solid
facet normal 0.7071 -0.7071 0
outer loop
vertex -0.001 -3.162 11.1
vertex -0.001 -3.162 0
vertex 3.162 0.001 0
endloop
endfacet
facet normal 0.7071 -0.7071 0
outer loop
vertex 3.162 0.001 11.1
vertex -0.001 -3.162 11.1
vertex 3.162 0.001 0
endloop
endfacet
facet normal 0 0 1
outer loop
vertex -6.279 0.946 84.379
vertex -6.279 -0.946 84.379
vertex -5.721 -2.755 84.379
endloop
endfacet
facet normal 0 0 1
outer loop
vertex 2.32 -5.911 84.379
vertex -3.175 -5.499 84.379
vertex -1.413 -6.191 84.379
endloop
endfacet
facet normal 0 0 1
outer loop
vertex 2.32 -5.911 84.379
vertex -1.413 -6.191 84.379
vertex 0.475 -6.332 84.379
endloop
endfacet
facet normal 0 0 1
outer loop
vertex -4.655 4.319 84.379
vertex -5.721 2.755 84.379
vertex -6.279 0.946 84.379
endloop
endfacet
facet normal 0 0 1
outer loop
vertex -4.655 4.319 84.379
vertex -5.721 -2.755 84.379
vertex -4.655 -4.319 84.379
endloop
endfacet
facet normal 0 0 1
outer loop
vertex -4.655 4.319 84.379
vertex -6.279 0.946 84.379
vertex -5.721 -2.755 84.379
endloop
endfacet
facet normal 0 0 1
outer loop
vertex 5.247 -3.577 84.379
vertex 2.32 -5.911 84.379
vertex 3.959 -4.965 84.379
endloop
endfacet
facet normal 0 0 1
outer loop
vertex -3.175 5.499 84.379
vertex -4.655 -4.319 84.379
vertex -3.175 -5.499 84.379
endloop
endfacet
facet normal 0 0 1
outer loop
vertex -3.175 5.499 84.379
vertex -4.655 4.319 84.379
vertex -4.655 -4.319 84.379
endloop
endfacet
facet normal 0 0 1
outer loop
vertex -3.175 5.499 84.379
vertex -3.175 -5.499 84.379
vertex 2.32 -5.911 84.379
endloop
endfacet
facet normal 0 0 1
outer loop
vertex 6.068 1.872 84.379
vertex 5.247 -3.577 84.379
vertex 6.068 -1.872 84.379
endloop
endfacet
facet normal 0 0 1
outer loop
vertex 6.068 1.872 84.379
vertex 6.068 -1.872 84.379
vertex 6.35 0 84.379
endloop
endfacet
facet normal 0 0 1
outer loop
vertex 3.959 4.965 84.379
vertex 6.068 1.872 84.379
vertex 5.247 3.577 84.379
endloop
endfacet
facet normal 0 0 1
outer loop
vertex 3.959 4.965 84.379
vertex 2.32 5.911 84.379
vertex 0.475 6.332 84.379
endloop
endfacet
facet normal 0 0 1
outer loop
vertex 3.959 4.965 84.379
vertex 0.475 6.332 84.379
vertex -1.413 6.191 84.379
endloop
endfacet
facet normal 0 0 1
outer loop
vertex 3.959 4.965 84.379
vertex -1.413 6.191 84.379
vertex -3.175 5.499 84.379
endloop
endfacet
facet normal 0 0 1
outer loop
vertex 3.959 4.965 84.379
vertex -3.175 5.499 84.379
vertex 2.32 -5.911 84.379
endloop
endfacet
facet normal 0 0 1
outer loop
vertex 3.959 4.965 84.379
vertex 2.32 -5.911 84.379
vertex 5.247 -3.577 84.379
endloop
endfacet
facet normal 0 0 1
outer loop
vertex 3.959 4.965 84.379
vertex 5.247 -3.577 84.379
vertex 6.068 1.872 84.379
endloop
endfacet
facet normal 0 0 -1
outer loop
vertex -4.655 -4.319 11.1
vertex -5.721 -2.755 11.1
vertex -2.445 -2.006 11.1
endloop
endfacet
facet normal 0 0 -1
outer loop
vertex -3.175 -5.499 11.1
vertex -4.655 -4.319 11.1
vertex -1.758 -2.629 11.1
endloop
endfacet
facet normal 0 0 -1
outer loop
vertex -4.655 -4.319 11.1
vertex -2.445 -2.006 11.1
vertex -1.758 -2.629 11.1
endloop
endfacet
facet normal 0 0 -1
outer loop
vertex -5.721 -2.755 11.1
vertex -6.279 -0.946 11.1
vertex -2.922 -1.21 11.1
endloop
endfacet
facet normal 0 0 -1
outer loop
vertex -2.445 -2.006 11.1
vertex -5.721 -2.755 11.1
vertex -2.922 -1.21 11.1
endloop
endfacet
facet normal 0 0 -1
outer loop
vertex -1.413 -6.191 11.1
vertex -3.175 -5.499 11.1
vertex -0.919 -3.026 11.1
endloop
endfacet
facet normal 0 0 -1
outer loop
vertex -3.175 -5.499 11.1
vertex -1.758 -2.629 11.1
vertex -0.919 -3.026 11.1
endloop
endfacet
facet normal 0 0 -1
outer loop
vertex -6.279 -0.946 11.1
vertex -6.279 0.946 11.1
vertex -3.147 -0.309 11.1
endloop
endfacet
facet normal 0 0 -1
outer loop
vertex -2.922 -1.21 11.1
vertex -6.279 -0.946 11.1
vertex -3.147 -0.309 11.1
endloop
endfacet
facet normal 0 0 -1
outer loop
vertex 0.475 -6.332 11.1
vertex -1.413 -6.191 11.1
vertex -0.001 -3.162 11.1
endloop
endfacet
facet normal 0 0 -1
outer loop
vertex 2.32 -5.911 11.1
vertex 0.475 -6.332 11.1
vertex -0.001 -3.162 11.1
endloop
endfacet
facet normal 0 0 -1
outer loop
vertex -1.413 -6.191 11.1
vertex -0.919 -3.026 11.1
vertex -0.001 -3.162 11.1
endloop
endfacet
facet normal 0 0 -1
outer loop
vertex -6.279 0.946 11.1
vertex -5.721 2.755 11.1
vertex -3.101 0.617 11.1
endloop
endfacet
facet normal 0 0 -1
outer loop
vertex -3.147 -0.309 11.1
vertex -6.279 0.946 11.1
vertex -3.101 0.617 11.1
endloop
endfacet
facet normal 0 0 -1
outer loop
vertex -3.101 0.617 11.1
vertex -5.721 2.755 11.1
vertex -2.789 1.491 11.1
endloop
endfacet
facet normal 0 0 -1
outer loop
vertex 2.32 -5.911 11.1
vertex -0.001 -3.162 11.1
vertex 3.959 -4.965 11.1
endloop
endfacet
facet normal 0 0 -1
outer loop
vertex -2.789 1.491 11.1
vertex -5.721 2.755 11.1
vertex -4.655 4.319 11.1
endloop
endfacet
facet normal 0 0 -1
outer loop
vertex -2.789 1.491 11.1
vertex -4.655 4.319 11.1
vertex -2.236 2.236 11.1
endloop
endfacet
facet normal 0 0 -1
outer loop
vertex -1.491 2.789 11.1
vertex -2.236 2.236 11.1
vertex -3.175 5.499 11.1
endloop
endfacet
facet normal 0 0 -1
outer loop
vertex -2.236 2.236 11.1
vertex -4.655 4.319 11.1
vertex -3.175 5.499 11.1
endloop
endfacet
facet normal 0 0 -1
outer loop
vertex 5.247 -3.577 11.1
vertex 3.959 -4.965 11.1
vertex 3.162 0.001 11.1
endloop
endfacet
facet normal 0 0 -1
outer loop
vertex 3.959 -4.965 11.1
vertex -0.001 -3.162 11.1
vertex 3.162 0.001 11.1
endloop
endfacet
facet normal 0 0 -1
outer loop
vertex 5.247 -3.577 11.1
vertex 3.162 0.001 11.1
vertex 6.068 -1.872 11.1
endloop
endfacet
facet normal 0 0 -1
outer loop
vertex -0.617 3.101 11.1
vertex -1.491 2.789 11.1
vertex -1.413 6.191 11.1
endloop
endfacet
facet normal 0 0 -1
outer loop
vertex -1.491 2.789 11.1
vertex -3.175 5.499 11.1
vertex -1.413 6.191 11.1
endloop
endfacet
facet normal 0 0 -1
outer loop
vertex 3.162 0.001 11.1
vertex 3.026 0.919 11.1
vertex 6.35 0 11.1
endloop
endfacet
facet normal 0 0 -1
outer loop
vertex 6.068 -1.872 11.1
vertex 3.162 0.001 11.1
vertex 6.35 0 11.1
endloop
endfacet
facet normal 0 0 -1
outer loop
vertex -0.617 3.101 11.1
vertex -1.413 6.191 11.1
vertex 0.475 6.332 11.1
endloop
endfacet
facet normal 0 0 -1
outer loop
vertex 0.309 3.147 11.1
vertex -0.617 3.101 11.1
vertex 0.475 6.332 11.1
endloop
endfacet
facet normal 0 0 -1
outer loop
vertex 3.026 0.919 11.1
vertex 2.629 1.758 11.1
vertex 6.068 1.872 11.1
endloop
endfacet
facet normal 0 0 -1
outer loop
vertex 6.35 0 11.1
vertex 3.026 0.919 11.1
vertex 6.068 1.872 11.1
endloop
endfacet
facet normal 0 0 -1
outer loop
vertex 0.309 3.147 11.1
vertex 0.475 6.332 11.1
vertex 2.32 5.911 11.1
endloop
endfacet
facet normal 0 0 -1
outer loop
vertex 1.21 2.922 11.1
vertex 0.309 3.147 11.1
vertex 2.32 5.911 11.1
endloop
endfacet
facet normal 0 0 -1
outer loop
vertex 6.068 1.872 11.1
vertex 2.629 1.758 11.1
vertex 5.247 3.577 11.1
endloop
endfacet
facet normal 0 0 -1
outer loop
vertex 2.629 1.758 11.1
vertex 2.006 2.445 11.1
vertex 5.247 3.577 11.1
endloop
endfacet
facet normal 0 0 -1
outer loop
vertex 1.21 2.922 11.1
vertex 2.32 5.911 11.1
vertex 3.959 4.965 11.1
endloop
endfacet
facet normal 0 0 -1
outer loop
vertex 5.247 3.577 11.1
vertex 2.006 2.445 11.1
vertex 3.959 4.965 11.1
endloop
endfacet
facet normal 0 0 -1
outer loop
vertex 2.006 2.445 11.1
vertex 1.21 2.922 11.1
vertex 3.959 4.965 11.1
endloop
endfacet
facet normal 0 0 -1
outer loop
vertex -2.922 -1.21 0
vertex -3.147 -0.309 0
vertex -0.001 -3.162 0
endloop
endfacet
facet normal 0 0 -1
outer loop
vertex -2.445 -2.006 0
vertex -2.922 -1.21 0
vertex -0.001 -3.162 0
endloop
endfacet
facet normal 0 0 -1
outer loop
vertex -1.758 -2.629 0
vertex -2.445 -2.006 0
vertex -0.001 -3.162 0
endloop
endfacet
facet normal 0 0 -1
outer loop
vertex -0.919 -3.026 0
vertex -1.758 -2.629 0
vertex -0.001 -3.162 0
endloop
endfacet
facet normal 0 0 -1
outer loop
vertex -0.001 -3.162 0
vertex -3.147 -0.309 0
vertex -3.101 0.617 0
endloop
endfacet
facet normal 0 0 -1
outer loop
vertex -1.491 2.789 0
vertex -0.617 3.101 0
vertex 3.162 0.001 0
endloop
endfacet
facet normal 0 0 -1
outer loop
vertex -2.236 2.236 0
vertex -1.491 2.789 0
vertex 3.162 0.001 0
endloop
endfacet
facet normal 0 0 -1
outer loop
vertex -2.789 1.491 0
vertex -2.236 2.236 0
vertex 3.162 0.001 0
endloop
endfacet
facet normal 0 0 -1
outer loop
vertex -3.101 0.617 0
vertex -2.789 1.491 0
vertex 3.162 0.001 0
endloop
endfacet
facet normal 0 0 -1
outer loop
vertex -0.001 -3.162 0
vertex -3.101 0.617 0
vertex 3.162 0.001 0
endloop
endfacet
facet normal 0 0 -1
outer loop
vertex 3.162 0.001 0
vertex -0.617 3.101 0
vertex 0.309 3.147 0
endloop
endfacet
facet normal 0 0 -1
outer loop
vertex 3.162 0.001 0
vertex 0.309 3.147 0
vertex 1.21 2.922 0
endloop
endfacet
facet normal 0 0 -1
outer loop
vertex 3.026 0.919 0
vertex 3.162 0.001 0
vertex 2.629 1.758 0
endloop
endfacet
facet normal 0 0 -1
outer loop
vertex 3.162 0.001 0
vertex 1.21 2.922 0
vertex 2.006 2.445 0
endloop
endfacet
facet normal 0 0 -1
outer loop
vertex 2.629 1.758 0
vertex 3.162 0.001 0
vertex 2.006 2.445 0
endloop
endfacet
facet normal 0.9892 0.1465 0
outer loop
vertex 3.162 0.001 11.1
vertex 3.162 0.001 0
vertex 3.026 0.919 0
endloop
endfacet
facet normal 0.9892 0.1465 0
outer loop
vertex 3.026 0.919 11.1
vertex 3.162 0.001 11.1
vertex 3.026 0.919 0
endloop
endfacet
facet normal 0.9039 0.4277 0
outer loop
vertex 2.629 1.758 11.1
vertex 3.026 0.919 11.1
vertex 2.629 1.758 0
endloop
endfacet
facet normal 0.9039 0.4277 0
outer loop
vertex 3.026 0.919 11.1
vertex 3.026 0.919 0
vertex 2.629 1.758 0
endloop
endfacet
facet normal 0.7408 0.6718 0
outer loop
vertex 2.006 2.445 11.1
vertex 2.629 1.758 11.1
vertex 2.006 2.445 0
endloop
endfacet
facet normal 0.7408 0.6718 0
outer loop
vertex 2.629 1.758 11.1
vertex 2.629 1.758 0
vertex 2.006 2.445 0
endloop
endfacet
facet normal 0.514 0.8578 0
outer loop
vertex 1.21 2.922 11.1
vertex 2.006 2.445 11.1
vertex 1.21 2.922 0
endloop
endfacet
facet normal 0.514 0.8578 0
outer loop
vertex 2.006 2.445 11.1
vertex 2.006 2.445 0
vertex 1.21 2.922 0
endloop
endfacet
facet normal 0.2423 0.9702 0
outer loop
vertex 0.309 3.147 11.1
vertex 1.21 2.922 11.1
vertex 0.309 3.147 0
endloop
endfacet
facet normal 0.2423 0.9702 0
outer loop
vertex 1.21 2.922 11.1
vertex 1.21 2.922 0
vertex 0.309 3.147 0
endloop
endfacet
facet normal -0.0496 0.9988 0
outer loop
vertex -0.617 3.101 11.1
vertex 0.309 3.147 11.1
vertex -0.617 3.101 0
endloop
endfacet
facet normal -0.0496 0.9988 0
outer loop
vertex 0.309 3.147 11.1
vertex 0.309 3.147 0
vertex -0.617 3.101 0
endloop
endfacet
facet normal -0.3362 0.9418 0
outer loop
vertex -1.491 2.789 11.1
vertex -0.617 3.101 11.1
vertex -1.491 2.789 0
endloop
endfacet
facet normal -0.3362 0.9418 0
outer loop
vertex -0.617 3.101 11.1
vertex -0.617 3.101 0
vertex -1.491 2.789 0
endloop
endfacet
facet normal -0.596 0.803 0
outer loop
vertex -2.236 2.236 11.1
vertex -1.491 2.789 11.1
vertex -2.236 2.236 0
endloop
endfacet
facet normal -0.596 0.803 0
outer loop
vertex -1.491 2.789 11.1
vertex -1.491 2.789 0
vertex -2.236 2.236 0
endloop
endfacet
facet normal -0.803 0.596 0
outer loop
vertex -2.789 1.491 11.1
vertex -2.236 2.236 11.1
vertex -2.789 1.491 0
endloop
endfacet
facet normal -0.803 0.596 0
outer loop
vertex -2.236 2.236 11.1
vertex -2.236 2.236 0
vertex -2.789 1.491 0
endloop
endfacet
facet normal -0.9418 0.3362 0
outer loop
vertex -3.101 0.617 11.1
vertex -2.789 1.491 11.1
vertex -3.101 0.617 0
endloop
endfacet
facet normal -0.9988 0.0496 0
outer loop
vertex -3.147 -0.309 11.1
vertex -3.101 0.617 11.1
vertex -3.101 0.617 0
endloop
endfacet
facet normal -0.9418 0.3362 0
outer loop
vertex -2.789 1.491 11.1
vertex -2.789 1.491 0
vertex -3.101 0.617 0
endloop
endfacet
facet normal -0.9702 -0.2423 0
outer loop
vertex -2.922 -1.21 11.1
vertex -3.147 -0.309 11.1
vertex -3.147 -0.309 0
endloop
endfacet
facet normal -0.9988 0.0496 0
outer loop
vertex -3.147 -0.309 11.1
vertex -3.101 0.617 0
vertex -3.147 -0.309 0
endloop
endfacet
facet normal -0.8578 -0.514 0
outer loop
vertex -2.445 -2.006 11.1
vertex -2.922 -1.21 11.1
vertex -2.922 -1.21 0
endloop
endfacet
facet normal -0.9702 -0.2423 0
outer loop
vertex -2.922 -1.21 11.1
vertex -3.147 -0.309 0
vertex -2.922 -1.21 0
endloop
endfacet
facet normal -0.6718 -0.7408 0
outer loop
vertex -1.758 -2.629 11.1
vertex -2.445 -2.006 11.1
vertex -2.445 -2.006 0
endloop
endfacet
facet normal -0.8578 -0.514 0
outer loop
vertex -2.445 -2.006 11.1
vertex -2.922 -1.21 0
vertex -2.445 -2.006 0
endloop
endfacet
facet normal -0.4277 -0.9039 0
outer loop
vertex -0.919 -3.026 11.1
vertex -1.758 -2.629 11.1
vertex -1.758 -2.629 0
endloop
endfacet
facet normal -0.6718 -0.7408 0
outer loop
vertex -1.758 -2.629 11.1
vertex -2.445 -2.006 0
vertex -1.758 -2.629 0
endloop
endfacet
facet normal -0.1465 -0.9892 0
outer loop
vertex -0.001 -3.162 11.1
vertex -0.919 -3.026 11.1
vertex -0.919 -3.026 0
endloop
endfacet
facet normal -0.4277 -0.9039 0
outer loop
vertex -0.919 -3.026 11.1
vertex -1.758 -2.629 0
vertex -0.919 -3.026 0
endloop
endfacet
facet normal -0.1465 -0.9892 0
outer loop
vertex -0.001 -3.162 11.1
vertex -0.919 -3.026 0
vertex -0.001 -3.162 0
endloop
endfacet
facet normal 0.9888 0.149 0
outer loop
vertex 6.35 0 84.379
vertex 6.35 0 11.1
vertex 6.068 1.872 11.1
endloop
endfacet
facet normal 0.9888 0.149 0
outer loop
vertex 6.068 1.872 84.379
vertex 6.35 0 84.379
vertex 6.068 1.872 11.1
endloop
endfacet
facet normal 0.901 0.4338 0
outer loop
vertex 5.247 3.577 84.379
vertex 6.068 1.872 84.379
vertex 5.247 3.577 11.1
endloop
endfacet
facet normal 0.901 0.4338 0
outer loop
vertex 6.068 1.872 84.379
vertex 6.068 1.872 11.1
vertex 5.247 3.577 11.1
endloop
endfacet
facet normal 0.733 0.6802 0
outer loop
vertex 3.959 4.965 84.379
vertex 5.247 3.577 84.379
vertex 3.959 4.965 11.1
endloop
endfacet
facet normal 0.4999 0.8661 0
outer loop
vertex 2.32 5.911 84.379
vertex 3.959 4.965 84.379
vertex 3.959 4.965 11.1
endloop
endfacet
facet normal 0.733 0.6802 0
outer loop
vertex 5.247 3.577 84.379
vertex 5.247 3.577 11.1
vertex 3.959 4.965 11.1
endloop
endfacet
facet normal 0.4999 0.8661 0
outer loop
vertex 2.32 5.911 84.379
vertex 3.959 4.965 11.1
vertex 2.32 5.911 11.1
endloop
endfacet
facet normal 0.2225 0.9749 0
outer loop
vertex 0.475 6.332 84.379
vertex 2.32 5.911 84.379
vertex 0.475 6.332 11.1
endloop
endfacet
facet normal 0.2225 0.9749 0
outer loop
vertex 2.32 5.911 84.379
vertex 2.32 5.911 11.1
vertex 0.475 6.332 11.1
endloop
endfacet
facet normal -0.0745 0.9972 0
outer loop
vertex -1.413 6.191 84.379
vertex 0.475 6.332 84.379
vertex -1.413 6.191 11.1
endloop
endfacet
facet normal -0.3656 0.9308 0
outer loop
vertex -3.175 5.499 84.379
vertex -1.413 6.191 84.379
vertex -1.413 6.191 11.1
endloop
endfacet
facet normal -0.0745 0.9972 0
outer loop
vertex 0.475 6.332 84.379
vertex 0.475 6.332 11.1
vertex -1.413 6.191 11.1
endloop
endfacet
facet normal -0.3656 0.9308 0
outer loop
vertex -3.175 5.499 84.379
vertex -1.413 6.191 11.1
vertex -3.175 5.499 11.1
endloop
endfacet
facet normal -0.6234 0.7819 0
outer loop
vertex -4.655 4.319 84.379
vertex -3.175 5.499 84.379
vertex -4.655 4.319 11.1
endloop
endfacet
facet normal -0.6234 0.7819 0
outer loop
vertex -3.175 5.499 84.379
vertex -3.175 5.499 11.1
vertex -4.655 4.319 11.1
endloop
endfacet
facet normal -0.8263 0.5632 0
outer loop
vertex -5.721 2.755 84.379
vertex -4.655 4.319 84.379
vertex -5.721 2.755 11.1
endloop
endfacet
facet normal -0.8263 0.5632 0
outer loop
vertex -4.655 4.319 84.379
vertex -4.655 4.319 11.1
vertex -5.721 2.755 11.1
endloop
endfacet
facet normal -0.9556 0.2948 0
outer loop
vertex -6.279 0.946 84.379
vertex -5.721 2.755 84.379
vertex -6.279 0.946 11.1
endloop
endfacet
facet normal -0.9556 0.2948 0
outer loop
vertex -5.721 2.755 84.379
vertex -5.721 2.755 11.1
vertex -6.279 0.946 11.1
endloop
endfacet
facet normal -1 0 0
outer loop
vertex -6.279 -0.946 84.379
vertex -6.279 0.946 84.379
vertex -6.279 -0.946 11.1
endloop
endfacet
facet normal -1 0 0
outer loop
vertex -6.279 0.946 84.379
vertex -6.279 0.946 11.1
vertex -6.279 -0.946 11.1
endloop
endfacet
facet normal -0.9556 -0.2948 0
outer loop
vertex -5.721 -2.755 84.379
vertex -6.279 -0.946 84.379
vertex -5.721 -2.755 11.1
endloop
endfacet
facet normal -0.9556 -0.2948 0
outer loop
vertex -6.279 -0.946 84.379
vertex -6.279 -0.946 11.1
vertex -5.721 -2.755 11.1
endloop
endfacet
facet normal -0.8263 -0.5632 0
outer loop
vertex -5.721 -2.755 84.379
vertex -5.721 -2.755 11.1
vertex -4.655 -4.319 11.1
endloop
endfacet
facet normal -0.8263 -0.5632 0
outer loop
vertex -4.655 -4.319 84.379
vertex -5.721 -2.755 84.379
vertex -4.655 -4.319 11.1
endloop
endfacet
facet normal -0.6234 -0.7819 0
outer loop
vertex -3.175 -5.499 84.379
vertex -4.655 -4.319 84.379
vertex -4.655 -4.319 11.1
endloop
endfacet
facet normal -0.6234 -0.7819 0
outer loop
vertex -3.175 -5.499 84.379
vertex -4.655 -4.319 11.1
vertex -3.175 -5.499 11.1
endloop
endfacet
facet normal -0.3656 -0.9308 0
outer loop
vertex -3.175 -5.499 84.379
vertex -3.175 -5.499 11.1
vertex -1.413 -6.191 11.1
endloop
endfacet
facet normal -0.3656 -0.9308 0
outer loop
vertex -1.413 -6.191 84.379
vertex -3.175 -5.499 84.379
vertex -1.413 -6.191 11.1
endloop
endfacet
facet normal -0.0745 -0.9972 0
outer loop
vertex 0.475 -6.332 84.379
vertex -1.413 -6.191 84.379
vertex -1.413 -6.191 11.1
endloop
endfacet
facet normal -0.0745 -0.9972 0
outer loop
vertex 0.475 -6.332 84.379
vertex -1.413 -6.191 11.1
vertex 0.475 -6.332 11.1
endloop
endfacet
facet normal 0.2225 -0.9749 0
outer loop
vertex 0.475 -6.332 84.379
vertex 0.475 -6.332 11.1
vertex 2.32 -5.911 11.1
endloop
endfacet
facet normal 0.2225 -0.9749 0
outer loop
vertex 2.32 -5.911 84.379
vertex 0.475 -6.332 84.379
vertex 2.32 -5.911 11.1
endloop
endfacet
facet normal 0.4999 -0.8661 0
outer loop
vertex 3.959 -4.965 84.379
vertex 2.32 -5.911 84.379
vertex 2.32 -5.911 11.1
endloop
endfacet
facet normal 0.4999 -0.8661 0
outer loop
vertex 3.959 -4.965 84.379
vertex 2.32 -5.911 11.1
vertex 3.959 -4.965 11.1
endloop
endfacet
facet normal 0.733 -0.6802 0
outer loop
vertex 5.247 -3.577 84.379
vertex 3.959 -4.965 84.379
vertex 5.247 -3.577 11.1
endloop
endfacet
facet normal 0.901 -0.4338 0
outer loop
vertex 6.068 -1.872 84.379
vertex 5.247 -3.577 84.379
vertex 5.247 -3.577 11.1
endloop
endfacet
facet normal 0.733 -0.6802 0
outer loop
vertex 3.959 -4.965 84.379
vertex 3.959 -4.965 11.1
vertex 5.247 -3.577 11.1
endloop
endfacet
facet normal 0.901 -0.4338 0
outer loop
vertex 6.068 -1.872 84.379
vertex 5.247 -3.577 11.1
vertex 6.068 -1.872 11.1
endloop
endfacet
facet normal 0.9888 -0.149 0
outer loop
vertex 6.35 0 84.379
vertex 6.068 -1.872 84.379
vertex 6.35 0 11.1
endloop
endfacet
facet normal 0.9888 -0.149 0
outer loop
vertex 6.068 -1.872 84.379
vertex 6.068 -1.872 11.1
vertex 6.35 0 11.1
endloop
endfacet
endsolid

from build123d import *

# Parameters (mm, degrees)
SKETCH1_R               = 3.1623
BOSS_EXTRUDE1_DEPTH     = 11.0998
CUT_EXTRUDE1_DEPTH      = 1
CUT_EXTRUDE1_DEPTH_BACK = 12.0998
SKETCH3_R               = 6.35
BOSS_EXTRUDE2_DEPTH     = 73.279


with BuildPart() as part:
    # Sketch1 → Boss-Extrude1 (new body)
    with BuildSketch(Plane.XY):
        Circle(SKETCH1_R)
    extrude(amount=BOSS_EXTRUDE1_DEPTH)

    # Sketch2 → Cut-Extrude1 (cut, two sides)
    with BuildSketch(Plane(origin=(0, 0, 0), x_dir=(-1, 0, 0), z_dir=(0, 0, -1))) as cut_extrude1_sk:
        Polygon((17.073178183, -20.234228338), (0.001249598, -3.162299753), (-3.162299753, 0.001249598), (-20.234228338, 17.073178183), (-54.378085507, -17.070678986), (-17.070678986, -54.378085507), align=None)
    extrude(amount=CUT_EXTRUDE1_DEPTH, mode=Mode.SUBTRACT)
    extrude(cut_extrude1_sk.sketch, amount=-CUT_EXTRUDE1_DEPTH_BACK, mode=Mode.SUBTRACT)

    # Sketch3 → Boss-Extrude2 (add)
    with BuildSketch(Plane.XY.offset(11.0998)):
        Circle(SKETCH3_R)
    extrude(amount=BOSS_EXTRUDE2_DEPTH)


solid = part.part
